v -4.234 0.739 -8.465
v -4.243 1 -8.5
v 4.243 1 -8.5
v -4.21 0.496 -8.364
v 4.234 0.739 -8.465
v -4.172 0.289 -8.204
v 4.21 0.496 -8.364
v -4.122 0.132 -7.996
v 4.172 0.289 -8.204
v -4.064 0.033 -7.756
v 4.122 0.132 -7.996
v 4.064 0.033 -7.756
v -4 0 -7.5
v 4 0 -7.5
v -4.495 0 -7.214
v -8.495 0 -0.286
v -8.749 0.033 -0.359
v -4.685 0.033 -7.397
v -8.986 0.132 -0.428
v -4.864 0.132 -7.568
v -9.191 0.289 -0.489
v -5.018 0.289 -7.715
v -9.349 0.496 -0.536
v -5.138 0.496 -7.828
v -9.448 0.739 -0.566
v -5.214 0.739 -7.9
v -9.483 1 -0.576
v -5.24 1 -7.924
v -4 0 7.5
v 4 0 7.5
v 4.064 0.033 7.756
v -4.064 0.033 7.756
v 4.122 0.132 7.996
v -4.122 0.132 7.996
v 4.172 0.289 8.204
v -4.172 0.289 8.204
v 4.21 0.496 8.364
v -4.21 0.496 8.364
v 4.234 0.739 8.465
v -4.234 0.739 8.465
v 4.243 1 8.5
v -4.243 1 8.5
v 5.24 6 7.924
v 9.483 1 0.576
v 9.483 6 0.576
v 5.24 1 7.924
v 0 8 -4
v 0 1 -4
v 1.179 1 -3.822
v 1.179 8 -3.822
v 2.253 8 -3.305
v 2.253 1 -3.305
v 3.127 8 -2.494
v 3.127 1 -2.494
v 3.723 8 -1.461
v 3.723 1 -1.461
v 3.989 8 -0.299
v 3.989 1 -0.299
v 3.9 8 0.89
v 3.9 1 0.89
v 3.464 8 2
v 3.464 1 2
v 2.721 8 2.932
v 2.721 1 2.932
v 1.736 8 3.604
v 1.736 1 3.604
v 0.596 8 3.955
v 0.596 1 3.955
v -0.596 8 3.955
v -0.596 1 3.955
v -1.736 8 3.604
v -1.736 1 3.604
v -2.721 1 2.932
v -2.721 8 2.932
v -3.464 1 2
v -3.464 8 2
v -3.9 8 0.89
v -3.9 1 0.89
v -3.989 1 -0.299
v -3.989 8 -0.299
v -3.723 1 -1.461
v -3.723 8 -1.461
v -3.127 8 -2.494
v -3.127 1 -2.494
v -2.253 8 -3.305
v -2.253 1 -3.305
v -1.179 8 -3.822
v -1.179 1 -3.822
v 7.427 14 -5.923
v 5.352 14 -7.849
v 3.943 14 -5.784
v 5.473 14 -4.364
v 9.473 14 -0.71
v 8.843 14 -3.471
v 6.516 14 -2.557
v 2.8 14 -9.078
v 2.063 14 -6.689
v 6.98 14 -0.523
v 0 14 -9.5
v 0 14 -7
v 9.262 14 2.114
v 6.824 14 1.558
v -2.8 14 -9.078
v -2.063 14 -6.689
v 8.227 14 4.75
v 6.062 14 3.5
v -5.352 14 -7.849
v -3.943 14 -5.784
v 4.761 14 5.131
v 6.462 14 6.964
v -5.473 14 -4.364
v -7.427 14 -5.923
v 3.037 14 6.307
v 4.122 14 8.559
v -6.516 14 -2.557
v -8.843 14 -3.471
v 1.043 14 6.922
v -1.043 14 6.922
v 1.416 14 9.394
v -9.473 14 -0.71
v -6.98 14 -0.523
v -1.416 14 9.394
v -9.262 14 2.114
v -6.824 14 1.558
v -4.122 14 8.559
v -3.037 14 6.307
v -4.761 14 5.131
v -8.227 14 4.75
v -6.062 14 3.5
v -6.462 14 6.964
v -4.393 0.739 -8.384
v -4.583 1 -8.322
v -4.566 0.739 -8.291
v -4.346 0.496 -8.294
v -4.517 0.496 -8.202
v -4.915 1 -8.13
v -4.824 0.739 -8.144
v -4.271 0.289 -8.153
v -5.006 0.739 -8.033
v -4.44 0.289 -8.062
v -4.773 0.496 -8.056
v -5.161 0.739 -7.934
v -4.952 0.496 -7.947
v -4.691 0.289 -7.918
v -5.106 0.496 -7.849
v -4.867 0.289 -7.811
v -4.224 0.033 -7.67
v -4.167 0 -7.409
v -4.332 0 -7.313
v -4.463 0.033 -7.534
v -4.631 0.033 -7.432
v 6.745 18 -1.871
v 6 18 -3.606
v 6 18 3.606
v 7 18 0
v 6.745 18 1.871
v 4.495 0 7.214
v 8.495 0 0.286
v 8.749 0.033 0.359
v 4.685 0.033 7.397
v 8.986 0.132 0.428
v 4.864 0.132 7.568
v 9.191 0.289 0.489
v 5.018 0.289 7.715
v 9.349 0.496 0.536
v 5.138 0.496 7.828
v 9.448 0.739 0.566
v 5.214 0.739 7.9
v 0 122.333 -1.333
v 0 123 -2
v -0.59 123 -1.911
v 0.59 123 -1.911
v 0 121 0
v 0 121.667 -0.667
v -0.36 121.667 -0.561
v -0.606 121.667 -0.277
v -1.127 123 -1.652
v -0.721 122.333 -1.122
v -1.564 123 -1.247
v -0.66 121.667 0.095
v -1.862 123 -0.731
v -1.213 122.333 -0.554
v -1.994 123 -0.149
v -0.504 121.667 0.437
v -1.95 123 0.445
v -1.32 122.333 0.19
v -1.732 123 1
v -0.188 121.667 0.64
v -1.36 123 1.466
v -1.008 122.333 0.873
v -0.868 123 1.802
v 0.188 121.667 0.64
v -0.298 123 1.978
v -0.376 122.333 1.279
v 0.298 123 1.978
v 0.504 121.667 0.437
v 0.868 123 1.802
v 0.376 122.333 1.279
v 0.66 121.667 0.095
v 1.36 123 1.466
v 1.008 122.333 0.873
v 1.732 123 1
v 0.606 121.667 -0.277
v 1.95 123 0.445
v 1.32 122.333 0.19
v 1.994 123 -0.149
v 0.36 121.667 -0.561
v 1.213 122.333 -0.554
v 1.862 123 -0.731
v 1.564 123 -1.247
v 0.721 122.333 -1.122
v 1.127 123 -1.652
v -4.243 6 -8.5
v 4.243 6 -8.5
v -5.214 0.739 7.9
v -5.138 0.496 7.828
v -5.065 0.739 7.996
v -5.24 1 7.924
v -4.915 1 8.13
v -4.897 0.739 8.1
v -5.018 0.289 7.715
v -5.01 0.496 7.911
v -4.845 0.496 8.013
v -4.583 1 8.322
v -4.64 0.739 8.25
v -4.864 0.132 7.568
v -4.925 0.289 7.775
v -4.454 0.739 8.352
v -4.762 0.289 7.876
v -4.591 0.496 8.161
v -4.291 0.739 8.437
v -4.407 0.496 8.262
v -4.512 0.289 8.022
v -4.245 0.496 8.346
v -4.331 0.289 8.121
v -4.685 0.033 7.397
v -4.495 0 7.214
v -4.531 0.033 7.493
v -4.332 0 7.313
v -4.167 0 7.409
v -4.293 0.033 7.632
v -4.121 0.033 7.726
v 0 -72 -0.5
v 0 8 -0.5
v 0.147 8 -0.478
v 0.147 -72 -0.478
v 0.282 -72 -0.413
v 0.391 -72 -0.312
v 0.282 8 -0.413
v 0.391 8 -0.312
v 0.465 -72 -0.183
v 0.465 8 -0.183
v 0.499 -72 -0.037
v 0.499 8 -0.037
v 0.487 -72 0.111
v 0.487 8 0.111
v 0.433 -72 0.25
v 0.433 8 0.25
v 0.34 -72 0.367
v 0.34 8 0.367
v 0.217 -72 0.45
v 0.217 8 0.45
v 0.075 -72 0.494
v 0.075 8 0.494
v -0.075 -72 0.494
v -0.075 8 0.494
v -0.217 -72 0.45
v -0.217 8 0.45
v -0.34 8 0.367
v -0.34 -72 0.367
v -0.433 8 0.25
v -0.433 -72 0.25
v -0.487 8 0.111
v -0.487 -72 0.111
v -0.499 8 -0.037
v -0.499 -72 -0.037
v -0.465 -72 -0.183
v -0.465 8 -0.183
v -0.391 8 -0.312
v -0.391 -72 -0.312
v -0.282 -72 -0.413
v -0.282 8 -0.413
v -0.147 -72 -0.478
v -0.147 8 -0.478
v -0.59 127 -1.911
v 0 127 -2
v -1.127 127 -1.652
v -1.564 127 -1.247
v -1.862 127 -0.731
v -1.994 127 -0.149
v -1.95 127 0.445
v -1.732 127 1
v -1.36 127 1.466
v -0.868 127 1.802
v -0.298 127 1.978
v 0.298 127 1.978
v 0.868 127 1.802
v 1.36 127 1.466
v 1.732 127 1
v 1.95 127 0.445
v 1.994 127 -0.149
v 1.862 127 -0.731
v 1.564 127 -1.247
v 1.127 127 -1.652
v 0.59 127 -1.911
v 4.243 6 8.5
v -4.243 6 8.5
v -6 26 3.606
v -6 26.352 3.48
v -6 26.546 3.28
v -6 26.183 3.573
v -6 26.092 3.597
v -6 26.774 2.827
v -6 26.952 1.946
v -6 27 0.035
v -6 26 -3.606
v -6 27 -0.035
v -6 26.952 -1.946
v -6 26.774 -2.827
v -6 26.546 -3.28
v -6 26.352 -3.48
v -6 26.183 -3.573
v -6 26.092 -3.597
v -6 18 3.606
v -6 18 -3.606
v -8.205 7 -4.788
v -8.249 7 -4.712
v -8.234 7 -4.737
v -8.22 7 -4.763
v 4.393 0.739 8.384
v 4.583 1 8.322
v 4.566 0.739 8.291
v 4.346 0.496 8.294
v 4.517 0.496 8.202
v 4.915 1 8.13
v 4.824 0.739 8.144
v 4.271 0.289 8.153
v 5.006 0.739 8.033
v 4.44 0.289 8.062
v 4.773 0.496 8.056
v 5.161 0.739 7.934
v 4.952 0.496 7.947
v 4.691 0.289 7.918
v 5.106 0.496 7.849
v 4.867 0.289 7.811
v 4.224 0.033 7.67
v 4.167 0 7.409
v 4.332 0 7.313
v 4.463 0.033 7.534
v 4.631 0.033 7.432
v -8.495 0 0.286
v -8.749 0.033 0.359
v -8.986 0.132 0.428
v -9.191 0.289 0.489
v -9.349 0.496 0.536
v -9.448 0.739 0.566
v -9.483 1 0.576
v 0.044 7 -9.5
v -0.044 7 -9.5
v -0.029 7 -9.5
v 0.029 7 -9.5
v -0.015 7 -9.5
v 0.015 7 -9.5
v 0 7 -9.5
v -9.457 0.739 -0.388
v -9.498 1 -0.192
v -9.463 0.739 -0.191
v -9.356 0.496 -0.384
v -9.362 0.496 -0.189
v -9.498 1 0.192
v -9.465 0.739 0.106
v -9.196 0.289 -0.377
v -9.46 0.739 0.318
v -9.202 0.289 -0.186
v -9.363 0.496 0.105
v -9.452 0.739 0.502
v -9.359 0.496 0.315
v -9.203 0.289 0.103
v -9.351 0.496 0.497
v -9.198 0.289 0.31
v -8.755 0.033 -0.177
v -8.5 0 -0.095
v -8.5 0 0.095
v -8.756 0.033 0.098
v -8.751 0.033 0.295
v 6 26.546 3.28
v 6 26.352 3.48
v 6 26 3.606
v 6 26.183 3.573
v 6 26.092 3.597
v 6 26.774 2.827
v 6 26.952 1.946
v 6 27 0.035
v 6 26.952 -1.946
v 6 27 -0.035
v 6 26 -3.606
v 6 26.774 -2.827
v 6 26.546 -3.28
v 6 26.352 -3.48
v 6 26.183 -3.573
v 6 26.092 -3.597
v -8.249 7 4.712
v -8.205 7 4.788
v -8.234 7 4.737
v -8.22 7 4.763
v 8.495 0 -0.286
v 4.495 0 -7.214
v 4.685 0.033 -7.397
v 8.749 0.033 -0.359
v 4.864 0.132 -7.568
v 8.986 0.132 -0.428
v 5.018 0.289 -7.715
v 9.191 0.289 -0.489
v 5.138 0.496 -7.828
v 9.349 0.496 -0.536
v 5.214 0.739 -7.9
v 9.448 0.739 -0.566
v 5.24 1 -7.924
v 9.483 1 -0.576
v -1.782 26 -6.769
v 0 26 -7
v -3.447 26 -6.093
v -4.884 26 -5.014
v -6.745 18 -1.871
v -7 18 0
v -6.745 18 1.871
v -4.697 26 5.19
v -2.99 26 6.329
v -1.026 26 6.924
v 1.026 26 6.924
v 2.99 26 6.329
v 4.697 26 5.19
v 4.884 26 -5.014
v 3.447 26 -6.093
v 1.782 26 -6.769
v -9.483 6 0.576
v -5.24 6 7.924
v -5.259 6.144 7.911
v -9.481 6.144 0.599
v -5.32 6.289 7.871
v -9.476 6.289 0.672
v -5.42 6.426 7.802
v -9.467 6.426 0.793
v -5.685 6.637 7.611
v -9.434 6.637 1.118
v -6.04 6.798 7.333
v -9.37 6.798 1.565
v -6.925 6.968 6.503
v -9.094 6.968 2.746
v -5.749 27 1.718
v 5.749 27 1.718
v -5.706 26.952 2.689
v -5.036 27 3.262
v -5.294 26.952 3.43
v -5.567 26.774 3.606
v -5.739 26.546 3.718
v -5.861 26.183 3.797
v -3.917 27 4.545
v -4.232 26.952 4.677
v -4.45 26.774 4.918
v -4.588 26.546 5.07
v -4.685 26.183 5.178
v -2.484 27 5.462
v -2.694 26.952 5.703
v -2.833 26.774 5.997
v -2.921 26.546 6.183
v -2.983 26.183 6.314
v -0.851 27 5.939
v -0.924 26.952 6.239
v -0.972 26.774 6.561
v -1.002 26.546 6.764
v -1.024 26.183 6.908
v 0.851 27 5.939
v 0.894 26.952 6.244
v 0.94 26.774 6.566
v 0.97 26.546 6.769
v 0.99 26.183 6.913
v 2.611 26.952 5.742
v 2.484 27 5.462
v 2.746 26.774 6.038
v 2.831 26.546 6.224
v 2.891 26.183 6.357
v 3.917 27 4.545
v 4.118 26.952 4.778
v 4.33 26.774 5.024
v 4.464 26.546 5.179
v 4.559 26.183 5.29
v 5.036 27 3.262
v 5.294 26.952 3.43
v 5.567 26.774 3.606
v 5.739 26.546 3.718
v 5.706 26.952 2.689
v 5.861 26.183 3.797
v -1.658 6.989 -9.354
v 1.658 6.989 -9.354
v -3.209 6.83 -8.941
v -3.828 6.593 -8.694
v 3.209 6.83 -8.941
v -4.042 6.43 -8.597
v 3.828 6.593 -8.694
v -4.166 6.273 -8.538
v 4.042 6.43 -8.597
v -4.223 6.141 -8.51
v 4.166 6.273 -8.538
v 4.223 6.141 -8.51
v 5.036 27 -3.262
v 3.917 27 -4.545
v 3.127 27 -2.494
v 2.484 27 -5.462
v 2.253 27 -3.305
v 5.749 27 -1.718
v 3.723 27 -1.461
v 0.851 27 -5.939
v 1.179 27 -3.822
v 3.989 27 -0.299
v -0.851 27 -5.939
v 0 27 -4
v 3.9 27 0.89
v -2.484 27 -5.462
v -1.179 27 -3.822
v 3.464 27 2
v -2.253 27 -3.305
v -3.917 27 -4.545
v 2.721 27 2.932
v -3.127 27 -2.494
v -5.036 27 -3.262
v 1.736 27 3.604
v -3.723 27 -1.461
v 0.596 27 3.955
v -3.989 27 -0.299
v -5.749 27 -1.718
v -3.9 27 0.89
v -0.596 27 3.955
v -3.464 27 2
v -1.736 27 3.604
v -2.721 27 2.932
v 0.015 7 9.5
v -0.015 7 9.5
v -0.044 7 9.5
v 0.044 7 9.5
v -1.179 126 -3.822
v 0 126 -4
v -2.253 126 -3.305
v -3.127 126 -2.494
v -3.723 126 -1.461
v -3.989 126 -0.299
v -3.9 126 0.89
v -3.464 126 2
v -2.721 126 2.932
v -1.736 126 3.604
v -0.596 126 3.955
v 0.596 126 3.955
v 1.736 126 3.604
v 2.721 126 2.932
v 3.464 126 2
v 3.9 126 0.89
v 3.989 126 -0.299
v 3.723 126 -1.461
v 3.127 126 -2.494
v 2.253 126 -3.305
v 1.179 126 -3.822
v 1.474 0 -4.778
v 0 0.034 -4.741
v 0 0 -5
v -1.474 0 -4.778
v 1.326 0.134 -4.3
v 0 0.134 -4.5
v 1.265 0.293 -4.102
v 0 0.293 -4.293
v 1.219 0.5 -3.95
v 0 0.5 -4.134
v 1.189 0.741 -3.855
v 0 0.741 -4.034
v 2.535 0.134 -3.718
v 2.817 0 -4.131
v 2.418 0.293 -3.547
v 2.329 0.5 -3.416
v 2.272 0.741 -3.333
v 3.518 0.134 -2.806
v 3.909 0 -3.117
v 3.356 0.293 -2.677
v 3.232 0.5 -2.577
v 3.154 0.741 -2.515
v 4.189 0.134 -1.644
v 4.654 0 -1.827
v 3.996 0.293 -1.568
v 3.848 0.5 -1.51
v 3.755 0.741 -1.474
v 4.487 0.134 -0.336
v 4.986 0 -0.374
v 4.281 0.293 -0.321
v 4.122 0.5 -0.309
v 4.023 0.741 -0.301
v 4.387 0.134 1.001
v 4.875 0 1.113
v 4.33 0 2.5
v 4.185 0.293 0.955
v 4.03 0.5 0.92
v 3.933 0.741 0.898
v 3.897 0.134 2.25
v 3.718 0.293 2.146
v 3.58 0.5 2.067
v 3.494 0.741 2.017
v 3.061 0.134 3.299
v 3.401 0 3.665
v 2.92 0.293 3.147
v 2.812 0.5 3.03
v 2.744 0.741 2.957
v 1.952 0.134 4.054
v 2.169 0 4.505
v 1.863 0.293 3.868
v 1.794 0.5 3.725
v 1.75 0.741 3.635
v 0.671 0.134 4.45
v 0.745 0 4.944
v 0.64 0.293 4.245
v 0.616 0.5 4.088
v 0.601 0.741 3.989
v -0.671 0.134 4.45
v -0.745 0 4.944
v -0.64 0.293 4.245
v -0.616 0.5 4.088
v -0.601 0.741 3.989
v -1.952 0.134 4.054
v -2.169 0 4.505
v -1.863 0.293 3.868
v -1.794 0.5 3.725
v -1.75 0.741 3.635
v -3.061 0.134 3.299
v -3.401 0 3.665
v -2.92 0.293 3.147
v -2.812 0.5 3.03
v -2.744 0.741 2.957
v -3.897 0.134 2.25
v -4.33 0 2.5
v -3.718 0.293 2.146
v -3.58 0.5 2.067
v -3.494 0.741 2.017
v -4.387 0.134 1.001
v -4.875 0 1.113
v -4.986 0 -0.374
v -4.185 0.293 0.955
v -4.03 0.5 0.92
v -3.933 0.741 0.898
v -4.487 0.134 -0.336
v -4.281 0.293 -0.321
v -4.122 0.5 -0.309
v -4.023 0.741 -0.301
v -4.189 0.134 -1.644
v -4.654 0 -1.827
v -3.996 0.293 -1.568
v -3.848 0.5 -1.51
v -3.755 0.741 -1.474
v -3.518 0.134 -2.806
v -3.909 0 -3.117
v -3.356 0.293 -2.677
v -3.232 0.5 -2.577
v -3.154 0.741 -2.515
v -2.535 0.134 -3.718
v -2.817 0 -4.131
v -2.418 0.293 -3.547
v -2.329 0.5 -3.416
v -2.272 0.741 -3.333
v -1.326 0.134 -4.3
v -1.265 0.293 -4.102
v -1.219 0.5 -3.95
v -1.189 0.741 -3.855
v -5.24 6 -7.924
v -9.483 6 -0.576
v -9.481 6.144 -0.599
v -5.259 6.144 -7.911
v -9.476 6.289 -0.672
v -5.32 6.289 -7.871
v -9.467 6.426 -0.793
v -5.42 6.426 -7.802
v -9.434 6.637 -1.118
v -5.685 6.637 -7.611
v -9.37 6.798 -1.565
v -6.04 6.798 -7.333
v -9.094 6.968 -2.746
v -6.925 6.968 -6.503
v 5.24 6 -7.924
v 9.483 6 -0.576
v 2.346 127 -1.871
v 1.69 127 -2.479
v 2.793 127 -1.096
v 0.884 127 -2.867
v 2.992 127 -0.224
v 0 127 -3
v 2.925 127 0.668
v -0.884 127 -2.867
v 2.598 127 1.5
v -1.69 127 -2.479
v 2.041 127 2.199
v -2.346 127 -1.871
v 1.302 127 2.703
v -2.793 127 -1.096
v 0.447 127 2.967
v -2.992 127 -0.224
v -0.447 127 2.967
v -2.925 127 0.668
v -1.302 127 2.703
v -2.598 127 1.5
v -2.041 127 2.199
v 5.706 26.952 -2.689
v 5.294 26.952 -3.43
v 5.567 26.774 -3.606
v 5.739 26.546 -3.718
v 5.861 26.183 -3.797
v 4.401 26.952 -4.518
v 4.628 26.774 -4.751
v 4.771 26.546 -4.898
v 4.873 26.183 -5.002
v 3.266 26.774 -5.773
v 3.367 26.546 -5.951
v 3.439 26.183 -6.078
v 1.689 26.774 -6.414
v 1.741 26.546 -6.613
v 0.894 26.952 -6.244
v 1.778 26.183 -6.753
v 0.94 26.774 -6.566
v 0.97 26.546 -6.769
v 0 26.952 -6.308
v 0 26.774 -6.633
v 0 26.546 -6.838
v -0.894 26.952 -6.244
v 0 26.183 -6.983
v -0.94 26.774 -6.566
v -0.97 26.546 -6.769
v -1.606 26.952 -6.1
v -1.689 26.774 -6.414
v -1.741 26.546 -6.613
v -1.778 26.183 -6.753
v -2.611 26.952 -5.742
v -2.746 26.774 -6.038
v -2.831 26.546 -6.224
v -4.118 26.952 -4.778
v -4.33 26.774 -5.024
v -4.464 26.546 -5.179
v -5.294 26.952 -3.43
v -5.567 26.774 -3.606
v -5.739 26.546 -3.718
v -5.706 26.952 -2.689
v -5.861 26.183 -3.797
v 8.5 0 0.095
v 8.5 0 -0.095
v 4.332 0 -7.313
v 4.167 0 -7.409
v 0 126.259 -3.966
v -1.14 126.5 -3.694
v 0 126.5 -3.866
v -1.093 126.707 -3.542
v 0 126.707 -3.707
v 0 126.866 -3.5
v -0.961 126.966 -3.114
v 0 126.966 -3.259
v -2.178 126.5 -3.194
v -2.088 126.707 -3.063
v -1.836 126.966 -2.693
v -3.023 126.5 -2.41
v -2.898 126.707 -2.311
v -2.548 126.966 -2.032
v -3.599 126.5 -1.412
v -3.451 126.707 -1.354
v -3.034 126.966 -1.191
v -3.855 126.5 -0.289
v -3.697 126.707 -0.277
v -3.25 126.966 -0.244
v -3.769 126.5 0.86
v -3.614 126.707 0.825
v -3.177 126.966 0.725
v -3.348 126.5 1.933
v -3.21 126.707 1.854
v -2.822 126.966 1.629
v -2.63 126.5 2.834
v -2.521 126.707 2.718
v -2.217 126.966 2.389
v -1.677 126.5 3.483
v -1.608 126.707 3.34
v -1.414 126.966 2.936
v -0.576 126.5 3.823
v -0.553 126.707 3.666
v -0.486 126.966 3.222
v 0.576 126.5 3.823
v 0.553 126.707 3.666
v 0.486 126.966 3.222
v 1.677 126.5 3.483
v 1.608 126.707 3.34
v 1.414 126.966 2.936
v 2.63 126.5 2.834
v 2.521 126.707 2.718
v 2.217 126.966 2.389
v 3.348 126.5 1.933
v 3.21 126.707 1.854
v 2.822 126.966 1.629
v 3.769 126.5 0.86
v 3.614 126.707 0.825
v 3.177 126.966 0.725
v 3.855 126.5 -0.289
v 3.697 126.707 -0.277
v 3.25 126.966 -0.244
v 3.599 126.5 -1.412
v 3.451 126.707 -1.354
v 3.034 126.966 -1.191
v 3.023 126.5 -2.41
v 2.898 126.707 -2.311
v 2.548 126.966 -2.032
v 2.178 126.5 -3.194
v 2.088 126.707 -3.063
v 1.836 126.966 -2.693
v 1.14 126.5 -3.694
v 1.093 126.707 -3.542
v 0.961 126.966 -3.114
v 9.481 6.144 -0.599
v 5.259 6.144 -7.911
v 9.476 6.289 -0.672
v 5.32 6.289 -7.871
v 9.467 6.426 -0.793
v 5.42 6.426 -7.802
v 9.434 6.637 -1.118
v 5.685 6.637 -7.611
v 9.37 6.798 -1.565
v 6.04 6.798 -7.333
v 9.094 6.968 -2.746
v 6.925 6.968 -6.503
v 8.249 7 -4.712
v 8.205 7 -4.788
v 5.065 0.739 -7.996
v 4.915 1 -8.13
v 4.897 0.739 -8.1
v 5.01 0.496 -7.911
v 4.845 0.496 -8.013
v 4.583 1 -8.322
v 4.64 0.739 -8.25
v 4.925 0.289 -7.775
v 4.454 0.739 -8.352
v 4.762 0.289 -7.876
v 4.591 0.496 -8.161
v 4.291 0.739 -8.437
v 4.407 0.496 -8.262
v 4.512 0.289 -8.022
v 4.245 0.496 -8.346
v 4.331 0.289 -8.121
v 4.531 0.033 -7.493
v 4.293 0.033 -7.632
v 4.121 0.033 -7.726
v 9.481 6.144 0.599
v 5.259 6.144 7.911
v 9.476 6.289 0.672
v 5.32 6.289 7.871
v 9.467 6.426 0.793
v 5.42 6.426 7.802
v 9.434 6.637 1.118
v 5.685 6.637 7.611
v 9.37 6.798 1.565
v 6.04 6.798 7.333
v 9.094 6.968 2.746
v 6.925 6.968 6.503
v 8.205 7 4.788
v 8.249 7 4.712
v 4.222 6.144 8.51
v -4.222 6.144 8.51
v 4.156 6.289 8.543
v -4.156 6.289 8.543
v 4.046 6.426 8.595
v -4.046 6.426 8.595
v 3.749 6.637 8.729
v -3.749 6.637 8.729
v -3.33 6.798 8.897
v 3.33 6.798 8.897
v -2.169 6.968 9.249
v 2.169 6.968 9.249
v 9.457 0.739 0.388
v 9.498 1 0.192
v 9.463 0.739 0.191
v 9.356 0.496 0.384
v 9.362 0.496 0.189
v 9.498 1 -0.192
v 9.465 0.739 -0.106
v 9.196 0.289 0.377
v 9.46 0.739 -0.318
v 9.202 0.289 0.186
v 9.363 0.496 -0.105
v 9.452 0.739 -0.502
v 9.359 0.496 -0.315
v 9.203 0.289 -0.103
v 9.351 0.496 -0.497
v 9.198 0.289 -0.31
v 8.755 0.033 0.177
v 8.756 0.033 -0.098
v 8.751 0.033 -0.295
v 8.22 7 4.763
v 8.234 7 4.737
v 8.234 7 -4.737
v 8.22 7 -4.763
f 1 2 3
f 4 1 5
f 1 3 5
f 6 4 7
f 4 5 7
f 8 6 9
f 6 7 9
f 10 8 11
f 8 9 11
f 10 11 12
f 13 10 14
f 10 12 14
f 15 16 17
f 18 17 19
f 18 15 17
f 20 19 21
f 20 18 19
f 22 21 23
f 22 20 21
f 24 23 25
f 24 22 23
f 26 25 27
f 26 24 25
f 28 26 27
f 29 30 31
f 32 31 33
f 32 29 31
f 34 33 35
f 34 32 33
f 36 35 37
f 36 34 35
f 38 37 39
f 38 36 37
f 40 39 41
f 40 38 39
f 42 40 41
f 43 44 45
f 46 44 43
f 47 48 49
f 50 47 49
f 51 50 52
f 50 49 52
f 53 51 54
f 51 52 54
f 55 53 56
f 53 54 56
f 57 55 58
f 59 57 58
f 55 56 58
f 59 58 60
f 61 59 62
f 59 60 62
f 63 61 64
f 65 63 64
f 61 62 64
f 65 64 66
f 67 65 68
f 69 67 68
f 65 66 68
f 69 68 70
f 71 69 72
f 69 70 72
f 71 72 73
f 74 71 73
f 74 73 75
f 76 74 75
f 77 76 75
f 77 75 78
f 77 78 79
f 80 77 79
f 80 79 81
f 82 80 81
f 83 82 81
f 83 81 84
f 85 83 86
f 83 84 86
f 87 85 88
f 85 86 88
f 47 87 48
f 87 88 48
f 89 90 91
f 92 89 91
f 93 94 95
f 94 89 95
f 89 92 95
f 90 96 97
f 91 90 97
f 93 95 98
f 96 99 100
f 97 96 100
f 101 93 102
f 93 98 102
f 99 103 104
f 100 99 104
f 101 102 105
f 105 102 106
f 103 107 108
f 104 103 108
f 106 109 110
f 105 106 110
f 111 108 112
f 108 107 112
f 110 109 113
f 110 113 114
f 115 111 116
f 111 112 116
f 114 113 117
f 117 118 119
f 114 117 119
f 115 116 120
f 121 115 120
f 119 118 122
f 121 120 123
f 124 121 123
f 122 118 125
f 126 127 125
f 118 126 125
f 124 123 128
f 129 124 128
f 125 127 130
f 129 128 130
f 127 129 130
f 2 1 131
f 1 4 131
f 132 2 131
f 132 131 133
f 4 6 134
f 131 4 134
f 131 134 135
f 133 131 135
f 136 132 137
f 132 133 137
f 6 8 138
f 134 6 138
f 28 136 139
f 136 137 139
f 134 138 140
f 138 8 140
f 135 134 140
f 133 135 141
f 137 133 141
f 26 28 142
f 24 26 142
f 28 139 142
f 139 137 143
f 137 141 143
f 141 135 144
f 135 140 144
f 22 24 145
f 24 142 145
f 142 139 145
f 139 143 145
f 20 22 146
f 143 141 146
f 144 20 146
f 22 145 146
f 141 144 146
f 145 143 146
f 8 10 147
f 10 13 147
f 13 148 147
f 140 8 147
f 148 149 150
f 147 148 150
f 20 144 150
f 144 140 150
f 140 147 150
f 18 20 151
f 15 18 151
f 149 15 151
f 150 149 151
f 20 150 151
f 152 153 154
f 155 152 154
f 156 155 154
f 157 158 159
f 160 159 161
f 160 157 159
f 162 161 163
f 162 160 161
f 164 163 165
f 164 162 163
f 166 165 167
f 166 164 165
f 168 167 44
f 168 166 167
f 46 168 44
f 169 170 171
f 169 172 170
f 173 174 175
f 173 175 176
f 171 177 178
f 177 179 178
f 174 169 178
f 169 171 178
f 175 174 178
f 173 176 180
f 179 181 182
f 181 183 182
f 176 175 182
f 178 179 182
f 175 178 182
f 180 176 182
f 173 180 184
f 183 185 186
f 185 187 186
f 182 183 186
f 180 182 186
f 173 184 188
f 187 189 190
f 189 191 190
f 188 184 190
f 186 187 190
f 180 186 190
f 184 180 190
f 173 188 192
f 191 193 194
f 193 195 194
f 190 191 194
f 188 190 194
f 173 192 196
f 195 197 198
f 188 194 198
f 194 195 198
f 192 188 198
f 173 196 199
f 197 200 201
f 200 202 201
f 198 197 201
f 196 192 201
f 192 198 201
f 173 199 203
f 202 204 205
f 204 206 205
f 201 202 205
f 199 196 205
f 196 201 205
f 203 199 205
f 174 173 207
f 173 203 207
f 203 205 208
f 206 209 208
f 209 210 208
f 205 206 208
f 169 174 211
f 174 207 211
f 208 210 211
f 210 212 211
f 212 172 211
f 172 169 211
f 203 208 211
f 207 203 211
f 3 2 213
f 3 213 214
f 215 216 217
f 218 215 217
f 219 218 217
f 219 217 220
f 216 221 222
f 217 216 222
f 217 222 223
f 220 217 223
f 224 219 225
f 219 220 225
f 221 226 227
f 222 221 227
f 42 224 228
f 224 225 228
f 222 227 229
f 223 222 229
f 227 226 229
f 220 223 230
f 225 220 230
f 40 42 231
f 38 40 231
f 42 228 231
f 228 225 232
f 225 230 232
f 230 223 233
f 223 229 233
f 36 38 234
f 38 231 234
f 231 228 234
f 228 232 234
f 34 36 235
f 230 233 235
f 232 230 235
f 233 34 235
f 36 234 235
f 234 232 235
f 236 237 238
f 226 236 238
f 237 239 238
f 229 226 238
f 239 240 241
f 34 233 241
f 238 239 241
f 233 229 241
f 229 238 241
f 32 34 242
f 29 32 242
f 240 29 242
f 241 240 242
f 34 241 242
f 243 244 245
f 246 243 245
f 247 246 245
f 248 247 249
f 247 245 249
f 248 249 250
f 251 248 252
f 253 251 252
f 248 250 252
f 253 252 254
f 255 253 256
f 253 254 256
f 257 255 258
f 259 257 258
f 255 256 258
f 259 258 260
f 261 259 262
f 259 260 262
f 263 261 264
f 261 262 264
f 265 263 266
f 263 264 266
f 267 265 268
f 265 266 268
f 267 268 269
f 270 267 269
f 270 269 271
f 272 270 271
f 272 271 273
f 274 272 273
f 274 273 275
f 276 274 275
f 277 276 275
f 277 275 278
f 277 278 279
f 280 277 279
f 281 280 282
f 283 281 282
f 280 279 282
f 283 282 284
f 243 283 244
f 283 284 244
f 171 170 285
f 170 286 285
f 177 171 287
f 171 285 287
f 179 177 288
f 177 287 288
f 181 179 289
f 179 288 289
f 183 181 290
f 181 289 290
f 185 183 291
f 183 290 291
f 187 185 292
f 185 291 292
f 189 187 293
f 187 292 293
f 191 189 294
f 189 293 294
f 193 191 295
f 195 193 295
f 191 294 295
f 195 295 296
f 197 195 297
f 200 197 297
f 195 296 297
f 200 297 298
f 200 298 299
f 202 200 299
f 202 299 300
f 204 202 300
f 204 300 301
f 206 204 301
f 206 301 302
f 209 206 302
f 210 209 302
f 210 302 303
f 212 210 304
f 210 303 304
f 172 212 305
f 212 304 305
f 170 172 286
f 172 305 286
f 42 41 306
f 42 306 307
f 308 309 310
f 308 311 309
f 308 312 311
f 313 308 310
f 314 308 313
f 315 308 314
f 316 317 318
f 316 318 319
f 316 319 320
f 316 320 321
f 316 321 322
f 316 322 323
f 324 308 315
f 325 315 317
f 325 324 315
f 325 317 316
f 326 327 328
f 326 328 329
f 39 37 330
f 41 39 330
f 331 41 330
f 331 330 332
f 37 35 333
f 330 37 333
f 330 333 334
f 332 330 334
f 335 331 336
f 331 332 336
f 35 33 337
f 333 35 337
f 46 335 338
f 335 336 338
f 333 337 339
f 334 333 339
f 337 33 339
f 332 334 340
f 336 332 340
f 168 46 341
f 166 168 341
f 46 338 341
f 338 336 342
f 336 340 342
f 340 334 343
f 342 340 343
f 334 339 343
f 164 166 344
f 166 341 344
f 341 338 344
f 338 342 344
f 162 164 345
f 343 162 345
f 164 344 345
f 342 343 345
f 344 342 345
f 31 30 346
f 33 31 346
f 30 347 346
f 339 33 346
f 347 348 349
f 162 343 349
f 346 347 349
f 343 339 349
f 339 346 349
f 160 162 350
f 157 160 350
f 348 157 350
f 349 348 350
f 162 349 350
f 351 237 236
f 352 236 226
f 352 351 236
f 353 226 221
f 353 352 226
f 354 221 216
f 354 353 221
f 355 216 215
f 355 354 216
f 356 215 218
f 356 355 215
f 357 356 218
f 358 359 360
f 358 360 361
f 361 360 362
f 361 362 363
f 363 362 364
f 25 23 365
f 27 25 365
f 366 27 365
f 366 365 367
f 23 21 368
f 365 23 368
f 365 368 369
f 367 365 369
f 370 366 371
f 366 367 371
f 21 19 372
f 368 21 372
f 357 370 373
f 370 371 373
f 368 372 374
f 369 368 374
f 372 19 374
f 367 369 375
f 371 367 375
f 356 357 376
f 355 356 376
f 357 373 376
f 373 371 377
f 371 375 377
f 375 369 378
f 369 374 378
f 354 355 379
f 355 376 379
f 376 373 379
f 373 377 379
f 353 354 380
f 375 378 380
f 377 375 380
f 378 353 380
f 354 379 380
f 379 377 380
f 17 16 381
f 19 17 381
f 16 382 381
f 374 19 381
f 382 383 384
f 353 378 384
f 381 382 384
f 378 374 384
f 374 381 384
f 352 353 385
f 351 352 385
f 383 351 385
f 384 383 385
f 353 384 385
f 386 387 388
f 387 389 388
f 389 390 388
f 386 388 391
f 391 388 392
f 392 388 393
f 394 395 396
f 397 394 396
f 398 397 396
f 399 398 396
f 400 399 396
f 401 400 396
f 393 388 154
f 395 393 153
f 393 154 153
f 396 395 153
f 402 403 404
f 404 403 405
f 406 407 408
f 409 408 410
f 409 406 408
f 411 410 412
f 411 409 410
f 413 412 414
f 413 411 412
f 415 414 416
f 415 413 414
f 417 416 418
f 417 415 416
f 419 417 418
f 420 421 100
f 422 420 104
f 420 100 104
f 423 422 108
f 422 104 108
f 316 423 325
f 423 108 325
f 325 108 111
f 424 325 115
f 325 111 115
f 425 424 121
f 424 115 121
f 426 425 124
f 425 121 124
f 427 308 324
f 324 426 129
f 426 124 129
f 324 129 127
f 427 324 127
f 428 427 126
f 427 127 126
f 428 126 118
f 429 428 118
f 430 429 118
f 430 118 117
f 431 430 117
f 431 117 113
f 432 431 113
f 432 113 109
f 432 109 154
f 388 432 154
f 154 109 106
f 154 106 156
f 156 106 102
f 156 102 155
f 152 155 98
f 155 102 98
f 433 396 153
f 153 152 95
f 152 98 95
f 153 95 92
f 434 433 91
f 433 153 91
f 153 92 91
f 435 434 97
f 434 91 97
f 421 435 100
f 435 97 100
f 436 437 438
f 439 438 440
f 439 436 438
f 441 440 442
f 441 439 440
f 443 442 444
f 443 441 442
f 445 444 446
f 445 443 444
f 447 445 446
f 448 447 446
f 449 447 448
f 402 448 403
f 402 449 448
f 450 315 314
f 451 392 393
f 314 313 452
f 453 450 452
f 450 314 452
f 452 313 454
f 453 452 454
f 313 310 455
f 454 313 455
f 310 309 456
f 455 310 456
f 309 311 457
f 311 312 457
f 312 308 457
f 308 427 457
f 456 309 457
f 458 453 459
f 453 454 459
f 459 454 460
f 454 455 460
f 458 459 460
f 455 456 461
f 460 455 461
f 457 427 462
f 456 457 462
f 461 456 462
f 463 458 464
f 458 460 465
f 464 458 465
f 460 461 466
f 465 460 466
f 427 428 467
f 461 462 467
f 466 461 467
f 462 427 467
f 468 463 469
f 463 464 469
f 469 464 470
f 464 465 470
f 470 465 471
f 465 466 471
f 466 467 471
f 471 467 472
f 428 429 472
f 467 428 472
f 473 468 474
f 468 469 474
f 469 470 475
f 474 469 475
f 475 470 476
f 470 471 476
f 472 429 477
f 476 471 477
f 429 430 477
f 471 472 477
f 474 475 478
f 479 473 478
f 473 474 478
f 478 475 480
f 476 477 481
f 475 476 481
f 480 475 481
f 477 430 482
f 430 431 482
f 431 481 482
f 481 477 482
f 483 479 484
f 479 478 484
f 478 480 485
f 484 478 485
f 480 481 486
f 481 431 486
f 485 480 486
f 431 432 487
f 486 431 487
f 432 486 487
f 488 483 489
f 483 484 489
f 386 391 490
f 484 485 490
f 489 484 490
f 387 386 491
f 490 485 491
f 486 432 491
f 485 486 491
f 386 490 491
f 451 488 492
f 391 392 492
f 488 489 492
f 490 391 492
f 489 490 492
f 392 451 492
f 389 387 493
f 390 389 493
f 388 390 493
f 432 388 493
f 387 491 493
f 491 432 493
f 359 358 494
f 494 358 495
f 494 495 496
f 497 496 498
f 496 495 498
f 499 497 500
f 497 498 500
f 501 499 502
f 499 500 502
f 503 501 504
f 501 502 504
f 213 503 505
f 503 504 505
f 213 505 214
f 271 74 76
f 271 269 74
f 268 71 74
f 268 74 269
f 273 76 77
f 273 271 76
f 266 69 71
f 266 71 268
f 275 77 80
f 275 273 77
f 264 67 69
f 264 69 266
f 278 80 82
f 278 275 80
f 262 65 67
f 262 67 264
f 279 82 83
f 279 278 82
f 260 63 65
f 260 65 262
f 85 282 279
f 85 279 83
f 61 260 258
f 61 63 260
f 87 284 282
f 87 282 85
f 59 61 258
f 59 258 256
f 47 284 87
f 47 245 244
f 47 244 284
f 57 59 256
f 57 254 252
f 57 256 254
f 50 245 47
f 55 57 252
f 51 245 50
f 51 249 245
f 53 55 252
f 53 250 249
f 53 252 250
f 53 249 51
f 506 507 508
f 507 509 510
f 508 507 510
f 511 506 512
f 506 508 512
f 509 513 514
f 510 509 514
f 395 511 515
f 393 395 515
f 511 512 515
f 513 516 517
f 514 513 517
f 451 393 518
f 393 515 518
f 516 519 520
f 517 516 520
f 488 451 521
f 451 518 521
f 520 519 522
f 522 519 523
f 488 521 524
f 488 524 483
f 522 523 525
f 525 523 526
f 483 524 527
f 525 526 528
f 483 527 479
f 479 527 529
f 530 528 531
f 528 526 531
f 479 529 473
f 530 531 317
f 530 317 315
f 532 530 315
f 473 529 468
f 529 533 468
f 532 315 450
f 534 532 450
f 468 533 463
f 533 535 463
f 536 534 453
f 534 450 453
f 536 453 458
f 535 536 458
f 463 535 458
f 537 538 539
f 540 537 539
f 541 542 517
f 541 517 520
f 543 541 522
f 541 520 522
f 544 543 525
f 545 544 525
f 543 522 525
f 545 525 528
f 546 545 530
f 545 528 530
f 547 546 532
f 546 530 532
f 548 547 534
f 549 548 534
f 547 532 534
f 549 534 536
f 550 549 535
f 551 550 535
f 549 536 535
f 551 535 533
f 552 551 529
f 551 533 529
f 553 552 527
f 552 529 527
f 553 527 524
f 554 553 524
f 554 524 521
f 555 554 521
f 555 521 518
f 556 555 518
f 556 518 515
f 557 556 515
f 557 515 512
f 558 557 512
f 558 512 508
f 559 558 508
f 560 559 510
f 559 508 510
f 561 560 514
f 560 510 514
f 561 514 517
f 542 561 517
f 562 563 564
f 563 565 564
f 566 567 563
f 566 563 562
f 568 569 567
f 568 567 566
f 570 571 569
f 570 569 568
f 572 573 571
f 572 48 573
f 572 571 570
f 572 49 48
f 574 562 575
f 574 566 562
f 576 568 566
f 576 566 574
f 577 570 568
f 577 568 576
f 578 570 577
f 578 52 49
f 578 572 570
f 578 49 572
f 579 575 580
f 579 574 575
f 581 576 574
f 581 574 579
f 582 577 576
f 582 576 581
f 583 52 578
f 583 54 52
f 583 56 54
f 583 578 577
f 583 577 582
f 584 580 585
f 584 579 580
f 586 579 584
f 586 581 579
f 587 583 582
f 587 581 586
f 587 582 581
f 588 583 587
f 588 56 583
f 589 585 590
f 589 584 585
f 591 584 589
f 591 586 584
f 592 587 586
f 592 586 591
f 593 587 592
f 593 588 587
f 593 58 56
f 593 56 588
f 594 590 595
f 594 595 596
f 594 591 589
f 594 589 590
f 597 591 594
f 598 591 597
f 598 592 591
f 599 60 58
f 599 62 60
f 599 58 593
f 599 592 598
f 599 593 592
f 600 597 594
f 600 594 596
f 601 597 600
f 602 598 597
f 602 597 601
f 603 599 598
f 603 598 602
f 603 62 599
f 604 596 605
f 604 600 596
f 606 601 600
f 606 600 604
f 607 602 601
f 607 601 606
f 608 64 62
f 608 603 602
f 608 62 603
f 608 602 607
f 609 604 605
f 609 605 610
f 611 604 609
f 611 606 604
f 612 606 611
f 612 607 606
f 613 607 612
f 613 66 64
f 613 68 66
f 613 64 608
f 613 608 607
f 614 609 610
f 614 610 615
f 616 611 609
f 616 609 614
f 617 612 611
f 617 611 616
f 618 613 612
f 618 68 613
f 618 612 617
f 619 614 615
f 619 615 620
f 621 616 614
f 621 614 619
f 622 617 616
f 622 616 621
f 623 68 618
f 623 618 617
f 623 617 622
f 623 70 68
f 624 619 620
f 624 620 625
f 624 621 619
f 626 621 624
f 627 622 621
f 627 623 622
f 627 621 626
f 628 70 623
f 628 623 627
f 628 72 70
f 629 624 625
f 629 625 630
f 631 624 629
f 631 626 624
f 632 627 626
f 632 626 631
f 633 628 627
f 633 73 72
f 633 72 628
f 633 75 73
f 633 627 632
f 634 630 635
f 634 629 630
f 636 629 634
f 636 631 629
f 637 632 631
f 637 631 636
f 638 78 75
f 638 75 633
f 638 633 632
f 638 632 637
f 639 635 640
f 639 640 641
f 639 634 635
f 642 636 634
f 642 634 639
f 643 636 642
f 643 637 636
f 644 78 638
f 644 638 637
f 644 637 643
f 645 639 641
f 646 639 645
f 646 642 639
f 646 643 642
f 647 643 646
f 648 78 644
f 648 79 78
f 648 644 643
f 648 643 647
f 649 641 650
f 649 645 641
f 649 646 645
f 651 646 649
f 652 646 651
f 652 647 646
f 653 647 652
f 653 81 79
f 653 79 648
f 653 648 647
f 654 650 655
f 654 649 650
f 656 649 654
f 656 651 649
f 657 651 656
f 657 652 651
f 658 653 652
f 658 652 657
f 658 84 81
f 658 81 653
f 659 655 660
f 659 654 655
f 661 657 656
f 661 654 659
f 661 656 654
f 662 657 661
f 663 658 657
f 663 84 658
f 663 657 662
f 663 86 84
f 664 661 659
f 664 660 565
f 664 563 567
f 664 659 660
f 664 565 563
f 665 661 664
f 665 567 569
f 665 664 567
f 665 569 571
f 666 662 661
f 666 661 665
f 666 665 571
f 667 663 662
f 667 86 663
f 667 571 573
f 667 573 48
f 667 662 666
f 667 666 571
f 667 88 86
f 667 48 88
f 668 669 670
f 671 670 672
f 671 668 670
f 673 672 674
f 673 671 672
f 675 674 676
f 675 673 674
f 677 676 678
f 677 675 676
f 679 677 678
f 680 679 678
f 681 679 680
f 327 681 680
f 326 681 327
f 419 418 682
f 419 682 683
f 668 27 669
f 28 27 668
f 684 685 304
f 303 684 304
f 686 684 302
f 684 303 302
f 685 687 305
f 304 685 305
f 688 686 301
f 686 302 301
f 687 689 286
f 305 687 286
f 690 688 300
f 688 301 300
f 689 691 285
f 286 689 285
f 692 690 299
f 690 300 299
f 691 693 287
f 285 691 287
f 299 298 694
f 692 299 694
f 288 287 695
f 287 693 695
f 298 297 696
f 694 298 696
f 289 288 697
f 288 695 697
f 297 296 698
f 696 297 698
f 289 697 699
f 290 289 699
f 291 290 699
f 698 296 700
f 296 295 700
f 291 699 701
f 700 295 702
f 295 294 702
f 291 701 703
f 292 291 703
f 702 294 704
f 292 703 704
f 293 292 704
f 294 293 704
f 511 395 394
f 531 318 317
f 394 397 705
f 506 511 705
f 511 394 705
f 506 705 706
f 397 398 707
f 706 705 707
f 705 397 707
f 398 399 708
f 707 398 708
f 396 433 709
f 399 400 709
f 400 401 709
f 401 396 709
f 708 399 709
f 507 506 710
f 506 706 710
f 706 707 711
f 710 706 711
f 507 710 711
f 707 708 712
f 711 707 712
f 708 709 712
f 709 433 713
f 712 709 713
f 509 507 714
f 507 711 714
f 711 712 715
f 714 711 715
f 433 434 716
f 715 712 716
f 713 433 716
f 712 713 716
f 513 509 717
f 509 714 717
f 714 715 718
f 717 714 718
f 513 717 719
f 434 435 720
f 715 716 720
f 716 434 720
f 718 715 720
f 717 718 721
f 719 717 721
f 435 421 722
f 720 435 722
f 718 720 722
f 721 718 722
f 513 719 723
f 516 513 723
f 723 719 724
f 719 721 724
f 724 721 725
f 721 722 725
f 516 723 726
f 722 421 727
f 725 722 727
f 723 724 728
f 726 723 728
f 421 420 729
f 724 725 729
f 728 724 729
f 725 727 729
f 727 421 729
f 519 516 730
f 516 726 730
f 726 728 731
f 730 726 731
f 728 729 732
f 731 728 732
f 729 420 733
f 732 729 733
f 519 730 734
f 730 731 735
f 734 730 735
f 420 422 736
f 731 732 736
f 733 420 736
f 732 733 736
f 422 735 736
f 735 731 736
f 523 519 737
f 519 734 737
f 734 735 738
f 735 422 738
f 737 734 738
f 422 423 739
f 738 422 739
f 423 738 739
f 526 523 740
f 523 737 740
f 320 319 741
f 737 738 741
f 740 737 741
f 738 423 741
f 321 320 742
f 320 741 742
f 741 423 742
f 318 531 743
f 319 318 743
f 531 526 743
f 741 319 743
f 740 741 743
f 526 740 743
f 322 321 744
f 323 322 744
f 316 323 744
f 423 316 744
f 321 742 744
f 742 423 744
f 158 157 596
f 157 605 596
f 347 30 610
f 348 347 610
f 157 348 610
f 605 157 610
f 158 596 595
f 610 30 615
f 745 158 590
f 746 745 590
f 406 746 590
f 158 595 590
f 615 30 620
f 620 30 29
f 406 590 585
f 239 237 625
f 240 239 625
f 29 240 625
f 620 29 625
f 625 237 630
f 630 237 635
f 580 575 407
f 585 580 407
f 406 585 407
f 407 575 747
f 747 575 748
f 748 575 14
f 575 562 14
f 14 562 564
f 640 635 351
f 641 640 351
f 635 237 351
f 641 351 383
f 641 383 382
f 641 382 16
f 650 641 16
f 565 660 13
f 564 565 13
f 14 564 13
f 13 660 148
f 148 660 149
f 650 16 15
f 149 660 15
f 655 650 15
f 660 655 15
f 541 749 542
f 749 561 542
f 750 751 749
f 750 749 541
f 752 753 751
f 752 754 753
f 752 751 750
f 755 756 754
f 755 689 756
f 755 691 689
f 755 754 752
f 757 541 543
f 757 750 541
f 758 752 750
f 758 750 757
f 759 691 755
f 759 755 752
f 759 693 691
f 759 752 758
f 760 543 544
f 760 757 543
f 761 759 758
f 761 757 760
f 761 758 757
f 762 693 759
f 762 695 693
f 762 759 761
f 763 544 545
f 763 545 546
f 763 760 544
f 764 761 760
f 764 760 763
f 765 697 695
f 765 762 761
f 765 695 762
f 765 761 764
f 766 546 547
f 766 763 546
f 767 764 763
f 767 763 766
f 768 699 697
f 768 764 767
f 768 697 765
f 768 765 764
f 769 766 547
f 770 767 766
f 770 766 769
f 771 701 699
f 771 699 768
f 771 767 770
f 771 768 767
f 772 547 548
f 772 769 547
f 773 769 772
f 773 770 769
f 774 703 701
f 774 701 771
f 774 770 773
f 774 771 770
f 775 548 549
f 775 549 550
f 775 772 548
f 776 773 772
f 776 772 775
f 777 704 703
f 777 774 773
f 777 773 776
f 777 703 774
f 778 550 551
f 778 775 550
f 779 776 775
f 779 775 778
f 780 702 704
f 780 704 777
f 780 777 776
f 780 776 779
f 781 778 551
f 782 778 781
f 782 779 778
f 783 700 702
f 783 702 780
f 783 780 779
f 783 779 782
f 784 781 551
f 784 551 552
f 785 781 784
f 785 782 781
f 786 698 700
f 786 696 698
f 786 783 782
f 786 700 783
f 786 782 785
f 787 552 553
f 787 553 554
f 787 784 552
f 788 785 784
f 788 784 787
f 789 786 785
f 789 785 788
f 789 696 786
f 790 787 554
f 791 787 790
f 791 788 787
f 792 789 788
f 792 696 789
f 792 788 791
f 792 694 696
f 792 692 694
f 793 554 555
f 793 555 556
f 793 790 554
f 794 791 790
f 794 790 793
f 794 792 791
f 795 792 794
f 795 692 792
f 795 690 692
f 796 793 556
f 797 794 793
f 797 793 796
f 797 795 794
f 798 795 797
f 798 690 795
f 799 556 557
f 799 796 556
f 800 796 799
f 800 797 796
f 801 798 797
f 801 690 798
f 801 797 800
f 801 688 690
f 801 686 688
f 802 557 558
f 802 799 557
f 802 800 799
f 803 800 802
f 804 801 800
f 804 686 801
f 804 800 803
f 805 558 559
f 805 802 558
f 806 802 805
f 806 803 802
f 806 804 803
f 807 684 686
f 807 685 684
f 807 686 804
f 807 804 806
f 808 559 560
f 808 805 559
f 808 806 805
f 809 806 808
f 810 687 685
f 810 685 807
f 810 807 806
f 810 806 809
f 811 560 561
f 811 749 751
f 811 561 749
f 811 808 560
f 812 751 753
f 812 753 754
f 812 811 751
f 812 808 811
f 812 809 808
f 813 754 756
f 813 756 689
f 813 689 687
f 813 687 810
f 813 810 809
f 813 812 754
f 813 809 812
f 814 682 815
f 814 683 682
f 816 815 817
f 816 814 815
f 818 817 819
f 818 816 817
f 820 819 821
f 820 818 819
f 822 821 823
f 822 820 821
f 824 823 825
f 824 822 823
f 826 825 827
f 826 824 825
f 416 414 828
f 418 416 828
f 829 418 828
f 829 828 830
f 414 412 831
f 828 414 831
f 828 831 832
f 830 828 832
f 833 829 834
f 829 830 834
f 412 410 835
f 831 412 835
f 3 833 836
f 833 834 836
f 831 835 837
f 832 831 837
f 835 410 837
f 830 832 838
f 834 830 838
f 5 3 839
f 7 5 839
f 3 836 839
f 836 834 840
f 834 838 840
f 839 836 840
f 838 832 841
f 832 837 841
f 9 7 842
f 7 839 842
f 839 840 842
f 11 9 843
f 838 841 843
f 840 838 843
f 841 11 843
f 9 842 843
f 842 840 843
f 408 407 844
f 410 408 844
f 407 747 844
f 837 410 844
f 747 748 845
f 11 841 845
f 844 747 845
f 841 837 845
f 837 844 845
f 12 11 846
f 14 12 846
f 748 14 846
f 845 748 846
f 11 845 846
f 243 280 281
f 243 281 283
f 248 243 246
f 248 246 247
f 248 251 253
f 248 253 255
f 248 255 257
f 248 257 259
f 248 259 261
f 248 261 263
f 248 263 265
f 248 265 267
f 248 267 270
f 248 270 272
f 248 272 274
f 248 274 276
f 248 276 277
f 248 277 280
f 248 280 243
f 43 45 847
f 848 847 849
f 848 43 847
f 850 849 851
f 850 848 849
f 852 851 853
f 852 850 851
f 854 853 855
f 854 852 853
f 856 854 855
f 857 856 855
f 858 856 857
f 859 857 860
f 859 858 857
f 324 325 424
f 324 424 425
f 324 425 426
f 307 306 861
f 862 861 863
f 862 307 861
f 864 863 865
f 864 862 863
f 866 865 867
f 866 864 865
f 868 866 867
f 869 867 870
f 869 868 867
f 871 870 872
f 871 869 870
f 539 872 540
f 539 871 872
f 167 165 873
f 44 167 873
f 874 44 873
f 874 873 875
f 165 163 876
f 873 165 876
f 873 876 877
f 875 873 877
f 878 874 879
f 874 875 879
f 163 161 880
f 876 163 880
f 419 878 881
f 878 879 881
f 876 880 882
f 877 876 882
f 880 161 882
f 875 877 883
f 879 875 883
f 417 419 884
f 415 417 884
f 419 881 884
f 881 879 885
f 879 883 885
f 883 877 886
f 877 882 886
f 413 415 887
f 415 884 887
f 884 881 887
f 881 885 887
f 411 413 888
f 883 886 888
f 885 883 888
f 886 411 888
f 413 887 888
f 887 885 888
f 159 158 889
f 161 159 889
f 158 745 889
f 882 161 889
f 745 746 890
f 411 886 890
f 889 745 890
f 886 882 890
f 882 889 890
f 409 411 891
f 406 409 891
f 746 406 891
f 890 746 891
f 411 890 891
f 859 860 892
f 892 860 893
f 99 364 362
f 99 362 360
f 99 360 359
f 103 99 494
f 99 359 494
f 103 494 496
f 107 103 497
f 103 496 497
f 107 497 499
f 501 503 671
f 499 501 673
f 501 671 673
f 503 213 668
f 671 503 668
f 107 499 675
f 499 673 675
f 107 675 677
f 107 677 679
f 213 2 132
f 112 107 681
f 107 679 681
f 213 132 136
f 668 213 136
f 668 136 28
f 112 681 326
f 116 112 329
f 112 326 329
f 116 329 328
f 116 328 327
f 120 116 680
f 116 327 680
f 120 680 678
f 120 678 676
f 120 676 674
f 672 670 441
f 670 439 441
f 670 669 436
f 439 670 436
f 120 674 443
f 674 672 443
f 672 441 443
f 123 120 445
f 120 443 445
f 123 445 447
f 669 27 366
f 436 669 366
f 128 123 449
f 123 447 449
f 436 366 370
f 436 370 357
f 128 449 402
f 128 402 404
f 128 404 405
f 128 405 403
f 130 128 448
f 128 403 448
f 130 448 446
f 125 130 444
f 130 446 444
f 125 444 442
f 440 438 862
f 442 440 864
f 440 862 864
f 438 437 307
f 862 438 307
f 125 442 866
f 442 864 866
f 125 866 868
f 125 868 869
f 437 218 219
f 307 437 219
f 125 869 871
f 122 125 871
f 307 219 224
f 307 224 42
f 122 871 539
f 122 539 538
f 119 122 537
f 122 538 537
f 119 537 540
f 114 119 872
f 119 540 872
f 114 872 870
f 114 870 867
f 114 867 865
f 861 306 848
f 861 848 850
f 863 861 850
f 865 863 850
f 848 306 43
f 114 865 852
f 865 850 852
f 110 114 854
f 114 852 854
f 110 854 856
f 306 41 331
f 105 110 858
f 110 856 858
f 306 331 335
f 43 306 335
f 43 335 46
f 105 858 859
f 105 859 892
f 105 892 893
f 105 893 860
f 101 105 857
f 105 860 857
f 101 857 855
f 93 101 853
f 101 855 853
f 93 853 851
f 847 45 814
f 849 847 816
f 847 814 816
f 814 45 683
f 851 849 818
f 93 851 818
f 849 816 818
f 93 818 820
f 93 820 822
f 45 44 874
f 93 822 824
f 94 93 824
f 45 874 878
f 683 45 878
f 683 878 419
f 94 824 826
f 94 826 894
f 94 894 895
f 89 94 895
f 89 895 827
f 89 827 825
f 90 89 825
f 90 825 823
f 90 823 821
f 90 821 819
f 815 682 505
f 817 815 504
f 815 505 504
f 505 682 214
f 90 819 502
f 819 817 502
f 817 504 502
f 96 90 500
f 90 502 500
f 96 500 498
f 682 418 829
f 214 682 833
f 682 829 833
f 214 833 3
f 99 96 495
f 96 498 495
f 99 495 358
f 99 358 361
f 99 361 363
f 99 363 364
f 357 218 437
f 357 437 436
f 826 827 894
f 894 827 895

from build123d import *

# Parameters (mm, degrees)
ESQUISSE2_R             = 4
ENL_V_MAT_EXTRU_1_DEPTH = 8
ENL_V_START             = -9
ENL_V_MAT_EXTRU_2_DEPTH = 9
ESQUISSE4_R             = 15
ENL_V_MAT_EXTRU_3_DEPTH = 7
CONG_1_R                = 1
ESQUISSE5_R             = 0.5
BOSS_EXTRU_1_DEPTH      = 80


with BuildPart() as part:
    # Esquisse1 → Révolution1 (revolve)
    with BuildSketch(Plane.XY, mode=Mode.PRIVATE) as r_volution1_sk:
        Polygon((4, 127), (4, 27), (7, 27), (7, 14), (9.5, 14), (9.5, 0), (0, 0), (0, 121), (2, 123), (2, 127), align=None)
    revolve(r_volution1_sk.sketch.rotate(Axis((0, 0, 0), (0, 1, 0)), 90), axis=Axis((0, 0, 0), (0, 1, 0)))

    # Esquisse2 → Enlèv. mat.-Extru.1 (cut)
    with BuildSketch(Plane.XZ):
        with Locations(Location((0, 0, 0), (0, 0, 270))):
            Circle(ESQUISSE2_R)
    extrude(amount=-ENL_V_MAT_EXTRU_1_DEPTH, mode=Mode.SUBTRACT)

    # Esquisse3 → Enlèv. mat.-Extru.2 (cut)
    with BuildSketch(Plane(origin=(0, 27, 0), x_dir=(1, 0, 0), z_dir=(0, 1, 0)).offset(ENL_V_START)):
        with BuildLine():
            Line((6, -3.605551275), (6, 3.605551275))
            ThreePointArc((6, 3.605551275), (7, 0), (6, -3.605551275))
        make_face()
        with BuildLine():
            Line((-6, -3.605551275), (-6, 3.605551275))
            ThreePointArc((-6, 3.605551275), (-7, 0), (-6, -3.605551275))
        make_face()
    extrude(amount=ENL_V_MAT_EXTRU_2_DEPTH, mode=Mode.SUBTRACT)

    # Esquisse4 → Enlèv. mat.-Extru.3 (cut)
    with BuildSketch(Plane.XZ):
        Circle(ESQUISSE4_R)
        Polygon((9.814954576, 0), (4.907477288, 8.5), (-4.907477288, 8.5), (-9.814954576, 0), (-4.907477288, -8.5), (4.907477288, -8.5), align=None, mode=Mode.SUBTRACT)
    extrude(amount=-ENL_V_MAT_EXTRU_3_DEPTH, mode=Mode.SUBTRACT)

    # Congé1
    cong_1_edges = [part.edges().sort_by_distance(p)[0] for p in [
        (0, 127, 4),
        (-3.446820352, 27, -6.092571663),
        (0, 27, 7),
        (0, 0, -8.5),
        (-4.75, 0, -8.227241336),
        (-7.361215932, 0, -4.25),
        (-9.5, 0, 0),
        (-7.361215932, 0, 4.25),
        (-4.75, 0, 8.227241336),
        (0, 0, 8.5),
        (4.75, 0, 8.227241336),
        (7.361215932, 0, 4.25),
        (9.5, 0, 0),
        (7.361215932, 0, -4.25),
        (4.75, 0, -8.227241336),
        (0, 0, 4),
        (0, 7, 8.5),
        (7.361215932, 7, 4.25),
        (7.361215932, 7, -4.25),
        (0, 7, -8.5),
        (-7.361215932, 7, -4.25),
        (-7.361215932, 7, 4.25),
    ]]
    fillet(cong_1_edges, radius=CONG_1_R - 0.0001)  # a hair under: the kernel refuses the full size

    # Esquisse5 → Boss.-Extru.1 (add)
    with BuildSketch(Plane.XZ.offset(-8)):
        with Locations(Location((0, 0, 0), (0, 0, 270))):
            Circle(ESQUISSE5_R)
    extrude(amount=BOSS_EXTRU_1_DEPTH)


solid = part.part
